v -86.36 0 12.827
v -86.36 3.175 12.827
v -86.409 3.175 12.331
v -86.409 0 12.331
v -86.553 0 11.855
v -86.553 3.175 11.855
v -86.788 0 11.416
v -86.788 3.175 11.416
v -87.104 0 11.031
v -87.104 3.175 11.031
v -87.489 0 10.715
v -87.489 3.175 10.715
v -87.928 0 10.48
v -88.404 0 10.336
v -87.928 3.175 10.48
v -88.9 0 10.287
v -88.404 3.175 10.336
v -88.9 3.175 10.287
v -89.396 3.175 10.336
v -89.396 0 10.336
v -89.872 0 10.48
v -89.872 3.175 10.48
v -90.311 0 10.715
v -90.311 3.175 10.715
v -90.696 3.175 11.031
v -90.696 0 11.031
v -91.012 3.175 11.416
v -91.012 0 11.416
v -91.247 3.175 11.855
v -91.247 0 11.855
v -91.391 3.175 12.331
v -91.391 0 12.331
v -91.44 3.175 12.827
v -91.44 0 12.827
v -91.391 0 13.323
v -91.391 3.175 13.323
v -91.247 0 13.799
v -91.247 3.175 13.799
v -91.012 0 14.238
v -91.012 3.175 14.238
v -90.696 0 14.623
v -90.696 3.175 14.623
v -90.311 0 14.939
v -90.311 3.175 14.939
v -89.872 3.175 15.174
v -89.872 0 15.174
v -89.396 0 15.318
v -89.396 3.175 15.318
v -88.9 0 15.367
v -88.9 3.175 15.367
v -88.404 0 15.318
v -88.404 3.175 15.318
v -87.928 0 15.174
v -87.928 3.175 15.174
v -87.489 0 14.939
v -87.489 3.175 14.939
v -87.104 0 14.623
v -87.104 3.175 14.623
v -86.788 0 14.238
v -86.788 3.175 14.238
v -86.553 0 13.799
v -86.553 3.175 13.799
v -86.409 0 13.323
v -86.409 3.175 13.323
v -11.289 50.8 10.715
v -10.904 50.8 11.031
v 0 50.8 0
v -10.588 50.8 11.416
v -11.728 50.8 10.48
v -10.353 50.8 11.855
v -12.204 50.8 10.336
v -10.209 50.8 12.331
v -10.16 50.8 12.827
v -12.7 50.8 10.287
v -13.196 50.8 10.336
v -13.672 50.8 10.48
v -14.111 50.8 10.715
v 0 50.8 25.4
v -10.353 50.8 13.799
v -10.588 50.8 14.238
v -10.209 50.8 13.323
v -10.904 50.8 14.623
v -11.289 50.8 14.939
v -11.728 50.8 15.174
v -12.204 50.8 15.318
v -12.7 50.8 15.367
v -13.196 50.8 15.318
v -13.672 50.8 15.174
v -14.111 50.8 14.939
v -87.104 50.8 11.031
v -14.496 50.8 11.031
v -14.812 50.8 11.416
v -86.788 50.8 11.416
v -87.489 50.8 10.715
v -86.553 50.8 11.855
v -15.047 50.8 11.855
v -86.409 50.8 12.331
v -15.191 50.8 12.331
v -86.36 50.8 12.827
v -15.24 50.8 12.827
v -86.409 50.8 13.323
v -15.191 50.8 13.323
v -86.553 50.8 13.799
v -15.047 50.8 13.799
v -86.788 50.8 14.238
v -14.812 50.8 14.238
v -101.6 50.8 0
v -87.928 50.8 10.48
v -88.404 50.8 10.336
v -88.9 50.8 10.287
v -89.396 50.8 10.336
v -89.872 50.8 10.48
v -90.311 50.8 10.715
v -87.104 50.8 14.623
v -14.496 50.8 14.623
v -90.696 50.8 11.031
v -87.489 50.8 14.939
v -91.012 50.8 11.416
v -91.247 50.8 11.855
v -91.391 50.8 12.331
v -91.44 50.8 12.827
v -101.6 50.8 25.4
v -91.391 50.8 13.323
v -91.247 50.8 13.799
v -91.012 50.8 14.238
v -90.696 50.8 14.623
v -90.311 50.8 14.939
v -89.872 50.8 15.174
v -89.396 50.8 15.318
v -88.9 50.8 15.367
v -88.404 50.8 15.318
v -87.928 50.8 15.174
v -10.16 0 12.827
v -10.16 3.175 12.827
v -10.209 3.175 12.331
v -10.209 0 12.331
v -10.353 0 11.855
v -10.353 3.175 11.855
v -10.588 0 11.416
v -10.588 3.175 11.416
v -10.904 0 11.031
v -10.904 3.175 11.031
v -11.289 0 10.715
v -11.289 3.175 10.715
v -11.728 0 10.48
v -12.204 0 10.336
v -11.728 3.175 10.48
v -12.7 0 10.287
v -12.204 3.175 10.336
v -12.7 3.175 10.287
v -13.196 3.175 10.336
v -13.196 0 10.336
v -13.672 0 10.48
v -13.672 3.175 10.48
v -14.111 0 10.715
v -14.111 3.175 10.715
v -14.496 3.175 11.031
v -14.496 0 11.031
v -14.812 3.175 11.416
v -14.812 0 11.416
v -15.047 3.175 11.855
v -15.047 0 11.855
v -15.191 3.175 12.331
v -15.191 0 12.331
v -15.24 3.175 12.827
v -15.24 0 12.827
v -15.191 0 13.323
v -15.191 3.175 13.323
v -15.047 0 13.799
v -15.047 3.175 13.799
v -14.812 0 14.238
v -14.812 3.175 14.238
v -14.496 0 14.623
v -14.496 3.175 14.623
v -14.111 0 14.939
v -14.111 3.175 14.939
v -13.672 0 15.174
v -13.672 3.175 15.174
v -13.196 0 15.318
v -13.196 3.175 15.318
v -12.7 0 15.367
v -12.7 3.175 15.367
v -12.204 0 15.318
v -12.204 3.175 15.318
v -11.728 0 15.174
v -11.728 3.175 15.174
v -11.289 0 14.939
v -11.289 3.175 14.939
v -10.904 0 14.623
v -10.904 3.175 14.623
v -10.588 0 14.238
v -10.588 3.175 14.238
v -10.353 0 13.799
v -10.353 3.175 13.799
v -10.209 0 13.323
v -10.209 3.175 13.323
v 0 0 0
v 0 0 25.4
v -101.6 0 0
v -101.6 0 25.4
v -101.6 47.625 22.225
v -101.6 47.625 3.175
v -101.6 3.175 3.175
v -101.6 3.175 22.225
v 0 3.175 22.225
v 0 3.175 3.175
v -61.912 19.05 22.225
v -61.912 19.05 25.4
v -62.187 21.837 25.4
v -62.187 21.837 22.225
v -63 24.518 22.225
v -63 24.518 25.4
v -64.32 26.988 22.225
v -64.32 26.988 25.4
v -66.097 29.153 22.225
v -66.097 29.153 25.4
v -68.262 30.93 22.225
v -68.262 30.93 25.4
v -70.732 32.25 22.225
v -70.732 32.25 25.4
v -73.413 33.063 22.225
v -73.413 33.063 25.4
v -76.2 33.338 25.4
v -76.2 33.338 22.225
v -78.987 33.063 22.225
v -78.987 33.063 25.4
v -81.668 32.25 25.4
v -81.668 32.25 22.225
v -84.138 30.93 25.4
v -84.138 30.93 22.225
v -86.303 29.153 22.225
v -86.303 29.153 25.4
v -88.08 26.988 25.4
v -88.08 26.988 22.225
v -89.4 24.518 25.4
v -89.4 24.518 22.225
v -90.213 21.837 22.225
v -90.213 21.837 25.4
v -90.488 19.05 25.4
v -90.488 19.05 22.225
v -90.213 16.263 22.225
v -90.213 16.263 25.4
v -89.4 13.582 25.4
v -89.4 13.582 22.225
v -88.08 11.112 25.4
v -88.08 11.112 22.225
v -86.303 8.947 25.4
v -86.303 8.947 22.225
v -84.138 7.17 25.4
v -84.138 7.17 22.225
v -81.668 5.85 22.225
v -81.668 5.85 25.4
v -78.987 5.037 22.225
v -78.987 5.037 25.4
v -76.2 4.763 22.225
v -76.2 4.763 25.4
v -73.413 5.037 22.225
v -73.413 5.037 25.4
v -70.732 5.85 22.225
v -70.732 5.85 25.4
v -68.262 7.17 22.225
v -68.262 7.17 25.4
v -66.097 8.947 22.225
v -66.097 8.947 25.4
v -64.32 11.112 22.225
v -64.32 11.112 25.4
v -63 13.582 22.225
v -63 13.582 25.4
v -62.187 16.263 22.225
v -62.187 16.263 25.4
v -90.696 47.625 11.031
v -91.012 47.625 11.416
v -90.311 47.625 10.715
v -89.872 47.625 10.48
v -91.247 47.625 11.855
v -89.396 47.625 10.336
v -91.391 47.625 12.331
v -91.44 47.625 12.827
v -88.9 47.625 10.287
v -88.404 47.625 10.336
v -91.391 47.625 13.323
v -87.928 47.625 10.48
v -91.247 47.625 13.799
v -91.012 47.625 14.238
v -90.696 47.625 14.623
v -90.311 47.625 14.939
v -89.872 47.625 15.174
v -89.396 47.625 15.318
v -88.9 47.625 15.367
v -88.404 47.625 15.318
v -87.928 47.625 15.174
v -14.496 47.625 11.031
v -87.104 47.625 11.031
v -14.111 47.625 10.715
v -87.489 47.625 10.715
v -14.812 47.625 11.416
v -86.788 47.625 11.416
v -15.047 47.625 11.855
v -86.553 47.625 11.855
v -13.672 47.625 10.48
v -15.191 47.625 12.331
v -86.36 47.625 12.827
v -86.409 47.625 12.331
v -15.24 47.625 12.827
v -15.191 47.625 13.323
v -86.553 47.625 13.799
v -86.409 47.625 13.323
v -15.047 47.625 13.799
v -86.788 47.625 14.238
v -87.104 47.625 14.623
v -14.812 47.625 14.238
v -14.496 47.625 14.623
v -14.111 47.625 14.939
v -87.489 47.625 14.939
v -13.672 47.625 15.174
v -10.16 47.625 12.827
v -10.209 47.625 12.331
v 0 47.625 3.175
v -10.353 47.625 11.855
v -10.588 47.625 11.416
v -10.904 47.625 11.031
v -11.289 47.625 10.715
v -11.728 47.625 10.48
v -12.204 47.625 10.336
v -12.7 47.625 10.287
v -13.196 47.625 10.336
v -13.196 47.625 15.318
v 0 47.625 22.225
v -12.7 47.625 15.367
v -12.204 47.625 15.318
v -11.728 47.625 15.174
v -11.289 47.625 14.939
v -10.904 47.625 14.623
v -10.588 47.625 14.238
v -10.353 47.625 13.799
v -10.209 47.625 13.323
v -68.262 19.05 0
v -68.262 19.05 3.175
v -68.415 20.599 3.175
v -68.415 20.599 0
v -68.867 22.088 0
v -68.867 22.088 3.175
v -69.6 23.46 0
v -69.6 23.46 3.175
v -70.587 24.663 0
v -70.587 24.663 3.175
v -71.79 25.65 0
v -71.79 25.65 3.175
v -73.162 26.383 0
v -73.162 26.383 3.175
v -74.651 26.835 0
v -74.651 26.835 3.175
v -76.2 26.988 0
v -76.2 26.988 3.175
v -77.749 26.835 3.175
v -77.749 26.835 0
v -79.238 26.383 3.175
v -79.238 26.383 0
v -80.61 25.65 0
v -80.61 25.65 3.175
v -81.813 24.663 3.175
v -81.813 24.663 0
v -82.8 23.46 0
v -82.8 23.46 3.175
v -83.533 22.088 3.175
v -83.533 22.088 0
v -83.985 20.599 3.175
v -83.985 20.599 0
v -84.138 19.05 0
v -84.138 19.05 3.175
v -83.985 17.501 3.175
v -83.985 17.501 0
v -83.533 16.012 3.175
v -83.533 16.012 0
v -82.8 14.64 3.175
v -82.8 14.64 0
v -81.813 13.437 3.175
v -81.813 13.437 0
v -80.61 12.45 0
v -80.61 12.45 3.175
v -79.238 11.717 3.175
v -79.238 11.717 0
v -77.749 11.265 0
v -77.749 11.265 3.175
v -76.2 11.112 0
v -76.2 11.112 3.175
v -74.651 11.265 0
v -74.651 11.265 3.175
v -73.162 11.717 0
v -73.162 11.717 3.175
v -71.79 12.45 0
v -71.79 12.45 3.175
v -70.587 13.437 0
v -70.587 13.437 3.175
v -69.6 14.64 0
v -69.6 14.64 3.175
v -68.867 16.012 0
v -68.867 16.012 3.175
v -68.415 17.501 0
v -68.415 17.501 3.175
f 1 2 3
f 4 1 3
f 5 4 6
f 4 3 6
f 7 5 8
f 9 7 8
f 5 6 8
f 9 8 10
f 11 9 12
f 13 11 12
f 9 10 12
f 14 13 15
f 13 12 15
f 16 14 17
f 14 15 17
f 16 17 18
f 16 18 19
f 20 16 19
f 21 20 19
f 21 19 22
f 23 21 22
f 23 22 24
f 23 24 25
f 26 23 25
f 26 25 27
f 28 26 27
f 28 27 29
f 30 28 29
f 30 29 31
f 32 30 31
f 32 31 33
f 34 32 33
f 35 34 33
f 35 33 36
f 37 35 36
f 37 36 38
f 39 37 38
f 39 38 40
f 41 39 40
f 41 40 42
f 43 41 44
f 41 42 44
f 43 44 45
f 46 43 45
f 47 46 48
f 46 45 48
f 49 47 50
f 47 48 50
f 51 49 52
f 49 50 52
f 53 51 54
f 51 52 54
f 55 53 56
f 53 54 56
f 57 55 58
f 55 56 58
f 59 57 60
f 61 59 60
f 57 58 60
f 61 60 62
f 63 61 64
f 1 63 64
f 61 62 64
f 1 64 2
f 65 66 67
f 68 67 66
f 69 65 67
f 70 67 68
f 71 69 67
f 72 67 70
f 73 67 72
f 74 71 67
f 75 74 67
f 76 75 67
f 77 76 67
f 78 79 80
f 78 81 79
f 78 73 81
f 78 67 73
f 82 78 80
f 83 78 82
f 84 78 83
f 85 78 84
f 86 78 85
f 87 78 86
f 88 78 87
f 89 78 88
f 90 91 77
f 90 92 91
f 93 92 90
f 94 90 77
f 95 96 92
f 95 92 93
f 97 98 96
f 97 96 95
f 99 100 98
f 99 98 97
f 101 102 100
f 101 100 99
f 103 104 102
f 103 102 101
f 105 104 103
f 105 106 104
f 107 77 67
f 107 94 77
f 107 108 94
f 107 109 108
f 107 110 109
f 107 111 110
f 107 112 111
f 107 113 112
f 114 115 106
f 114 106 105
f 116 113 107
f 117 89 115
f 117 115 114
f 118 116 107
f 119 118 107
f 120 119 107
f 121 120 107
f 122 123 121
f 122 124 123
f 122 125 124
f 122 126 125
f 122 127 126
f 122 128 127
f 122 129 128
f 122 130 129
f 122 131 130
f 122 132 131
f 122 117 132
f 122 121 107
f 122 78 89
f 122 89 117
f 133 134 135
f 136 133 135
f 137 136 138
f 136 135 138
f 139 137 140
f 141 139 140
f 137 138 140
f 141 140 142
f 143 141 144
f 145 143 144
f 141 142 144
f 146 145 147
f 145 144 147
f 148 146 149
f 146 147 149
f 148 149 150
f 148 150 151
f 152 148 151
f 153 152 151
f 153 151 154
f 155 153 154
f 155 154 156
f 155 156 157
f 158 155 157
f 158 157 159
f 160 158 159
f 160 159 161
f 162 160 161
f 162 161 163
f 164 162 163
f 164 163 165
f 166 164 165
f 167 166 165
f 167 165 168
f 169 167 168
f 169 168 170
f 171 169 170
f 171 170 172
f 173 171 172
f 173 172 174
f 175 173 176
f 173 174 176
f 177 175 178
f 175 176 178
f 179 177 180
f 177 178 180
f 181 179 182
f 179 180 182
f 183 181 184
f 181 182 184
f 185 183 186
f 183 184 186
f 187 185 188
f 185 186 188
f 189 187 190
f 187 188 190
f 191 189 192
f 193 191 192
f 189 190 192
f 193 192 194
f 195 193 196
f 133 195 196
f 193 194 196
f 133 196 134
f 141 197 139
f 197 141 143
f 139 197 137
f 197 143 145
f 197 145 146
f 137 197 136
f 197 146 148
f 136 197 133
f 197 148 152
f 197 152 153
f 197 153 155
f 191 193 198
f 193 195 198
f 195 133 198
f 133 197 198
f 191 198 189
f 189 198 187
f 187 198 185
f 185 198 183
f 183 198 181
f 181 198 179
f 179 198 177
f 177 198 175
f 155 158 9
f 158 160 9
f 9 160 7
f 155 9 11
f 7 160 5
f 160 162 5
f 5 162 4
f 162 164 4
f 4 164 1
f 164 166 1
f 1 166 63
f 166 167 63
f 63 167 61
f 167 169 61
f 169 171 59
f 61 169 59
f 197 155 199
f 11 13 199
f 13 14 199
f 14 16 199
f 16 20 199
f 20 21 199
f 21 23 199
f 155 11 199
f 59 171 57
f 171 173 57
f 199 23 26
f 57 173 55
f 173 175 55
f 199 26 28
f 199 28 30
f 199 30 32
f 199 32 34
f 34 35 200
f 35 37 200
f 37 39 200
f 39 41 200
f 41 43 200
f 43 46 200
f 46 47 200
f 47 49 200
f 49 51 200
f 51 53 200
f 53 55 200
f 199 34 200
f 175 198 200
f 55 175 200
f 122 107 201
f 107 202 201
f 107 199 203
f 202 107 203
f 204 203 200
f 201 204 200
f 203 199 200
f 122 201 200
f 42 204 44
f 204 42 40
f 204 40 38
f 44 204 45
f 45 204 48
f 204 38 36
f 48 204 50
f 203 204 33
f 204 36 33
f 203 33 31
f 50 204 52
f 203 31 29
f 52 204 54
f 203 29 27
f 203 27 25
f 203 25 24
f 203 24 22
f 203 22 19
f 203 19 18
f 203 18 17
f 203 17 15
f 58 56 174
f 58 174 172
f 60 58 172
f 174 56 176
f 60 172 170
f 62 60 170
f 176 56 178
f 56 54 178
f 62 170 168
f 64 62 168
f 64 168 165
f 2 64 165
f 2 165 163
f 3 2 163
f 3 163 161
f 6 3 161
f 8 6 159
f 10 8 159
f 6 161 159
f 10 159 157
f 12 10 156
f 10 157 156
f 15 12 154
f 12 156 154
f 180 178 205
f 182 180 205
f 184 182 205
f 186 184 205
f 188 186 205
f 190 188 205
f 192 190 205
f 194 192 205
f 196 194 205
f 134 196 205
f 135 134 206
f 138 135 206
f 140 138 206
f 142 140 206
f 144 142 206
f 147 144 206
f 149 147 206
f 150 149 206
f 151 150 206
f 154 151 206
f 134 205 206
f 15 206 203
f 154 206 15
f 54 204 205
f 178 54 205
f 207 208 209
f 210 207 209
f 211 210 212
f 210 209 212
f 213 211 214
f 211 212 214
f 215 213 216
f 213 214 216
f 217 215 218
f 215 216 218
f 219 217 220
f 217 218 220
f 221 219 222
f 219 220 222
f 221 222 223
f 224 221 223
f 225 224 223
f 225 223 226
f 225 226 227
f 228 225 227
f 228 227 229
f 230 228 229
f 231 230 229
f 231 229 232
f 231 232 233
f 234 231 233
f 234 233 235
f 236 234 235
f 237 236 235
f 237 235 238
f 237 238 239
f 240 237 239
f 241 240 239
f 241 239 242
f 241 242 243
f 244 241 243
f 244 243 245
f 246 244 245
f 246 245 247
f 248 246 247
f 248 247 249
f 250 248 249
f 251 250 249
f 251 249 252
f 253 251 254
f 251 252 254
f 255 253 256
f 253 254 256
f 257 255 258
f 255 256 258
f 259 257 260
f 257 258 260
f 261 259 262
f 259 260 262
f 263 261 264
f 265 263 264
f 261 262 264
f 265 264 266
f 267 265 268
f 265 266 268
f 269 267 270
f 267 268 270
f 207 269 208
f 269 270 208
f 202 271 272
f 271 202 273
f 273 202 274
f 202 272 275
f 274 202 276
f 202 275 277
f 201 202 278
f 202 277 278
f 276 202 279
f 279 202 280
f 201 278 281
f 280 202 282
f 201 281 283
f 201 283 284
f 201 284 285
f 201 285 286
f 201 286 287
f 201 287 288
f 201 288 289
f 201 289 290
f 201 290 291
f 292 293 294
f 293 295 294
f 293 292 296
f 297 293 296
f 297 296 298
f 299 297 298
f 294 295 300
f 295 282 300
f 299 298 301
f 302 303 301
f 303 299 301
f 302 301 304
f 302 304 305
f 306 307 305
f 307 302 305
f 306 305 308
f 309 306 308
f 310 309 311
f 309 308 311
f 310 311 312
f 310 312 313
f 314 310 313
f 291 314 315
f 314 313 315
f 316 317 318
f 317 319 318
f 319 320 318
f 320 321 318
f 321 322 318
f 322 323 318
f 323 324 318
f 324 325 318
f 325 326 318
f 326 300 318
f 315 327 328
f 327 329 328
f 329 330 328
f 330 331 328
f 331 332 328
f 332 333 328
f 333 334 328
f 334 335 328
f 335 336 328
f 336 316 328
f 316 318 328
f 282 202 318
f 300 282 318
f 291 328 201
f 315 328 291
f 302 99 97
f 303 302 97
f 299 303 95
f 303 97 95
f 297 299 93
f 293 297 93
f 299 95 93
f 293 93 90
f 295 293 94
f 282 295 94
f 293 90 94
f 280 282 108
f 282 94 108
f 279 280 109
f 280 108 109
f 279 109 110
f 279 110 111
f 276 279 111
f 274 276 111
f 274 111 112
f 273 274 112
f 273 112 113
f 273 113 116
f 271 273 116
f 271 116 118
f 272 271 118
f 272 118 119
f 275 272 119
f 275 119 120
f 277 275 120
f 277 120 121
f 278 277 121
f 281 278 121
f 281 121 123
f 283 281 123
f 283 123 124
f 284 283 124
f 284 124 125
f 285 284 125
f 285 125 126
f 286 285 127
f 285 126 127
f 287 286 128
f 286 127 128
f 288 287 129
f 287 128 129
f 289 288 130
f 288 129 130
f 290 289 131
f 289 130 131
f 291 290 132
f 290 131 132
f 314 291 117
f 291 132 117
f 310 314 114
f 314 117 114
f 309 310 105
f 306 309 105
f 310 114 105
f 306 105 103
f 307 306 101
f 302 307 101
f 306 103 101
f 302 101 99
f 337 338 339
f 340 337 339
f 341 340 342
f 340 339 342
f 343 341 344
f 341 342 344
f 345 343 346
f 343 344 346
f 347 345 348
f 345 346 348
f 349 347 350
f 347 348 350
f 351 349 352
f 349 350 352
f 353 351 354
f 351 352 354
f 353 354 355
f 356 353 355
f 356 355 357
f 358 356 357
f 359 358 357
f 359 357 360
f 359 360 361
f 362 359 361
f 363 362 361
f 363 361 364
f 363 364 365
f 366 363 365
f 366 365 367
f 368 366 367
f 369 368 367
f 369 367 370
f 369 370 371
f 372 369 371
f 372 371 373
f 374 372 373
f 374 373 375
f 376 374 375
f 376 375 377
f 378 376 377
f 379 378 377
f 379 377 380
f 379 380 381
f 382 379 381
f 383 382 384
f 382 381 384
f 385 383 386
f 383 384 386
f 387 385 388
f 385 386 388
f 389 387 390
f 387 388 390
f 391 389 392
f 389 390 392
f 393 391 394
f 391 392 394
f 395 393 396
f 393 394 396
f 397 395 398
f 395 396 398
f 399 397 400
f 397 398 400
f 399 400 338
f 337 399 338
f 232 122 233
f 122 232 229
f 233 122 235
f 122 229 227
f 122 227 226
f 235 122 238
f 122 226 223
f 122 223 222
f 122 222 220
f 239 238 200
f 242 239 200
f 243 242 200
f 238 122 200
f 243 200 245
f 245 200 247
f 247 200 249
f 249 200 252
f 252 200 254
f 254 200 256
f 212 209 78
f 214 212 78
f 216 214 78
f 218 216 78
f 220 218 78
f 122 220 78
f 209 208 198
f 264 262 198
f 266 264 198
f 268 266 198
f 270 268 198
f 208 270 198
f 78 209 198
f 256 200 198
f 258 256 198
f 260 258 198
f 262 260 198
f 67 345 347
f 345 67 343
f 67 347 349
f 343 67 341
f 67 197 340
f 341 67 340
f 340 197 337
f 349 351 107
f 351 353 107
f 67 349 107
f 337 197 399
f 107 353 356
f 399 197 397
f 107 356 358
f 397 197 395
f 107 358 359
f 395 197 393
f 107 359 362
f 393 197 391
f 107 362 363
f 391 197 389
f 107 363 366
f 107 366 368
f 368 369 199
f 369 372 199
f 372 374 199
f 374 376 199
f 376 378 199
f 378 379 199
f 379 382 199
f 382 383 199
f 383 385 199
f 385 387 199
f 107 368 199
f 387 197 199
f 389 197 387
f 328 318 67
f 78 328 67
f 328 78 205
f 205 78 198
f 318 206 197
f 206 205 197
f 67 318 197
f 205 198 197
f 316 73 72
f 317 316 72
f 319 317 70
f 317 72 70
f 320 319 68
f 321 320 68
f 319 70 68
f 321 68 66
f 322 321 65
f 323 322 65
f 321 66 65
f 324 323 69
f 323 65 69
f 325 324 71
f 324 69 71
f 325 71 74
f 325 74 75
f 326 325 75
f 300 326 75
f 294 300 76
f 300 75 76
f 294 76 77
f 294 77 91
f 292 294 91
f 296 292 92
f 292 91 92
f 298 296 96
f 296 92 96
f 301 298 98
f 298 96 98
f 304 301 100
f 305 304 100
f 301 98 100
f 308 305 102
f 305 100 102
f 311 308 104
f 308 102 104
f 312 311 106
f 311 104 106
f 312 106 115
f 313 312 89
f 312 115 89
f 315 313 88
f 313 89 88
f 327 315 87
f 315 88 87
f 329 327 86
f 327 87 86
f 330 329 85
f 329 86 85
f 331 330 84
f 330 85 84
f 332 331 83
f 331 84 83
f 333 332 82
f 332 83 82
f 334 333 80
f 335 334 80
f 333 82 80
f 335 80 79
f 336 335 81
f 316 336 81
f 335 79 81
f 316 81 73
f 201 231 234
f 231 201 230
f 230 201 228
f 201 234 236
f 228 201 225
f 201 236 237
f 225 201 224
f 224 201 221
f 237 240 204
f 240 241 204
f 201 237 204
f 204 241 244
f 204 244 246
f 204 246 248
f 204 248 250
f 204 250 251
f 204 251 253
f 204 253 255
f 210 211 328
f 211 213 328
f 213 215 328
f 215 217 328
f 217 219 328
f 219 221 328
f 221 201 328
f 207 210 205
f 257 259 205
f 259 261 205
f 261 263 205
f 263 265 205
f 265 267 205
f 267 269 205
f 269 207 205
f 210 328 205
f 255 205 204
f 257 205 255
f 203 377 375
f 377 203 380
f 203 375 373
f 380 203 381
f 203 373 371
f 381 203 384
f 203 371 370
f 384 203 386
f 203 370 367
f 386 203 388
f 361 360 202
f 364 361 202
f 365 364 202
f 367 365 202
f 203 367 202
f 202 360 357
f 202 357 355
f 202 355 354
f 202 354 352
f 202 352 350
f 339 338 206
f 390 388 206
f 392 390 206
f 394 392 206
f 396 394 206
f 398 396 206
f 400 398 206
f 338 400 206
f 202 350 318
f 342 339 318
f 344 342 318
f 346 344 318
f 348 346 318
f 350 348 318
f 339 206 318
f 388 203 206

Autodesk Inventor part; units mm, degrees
ref_plane "YZ Plane" through (0, 0, 0) normal (1, 0, 0) x (0, 1, 0)
ref_plane "XZ Plane" through (0, 0, 0) normal (0, 1, 0) x (-1, 0, 0)
ref_plane "XY Plane" through (0, 0, 0) normal (0, 0, 1) x (1, 0, 0)
sketch "Sketch1" plane through (0, 0, 0) normal (0, 1, 0) x (-1, 0, 0)
  line L0 (0, 0) -> (101.6, 0)
  line L1 (101.6, 0) -> (101.6, 25.4)
  line L2 (101.6, 25.4) -> (0, 25.4)
  line L3 (0, 25.4) -> (0, 0)
  dimension "d0" = 101.6
  dimension "d1" = 25.4
extrude "Extrusion1" add sketch "Sketch1" along normal blind 50.8
sketch "Sketch2" plane through (-101.6, 0, 25.4) normal (0, 0, 1) x (1, 0, 0)
  circle A0 centre (25.4, 19.05) radius 7.9375
  line L0 (101.6, 50.8) -> (0, 50.8) projected
  line L1 (101.6, 0) -> (101.6, 50.8) projected
  dimension "d4" = 15.875
  dimension "d5" = 31.75
  dimension "d6" = 76.2
extrude "Extrusion2" cut sketch "Sketch2" against normal blind 111.125
sketch "Sketch3" plane through (0, 0, 25.4) normal (1, 0, 0) x (0, 0, -1)
  line L0 (3.175, 3.175) -> (22.225, 3.175)
  line L1 (22.225, 3.175) -> (22.225, 47.625)
  line L2 (22.225, 47.625) -> (3.175, 47.625)
  line L3 (3.175, 47.625) -> (3.175, 3.175)
  line L4 (0, 0) -> (0, 50.8) projected
  line L5 (0, 0) -> (25.4, 0) projected
  line L6 (25.4, 0) -> (25.4, 50.8) projected
  line L7 (25.4, 50.8) -> (0, 50.8) projected
  dimension "d9" = 3.175
  dimension "d10" = 3.175
  dimension "d11" = 3.175
  dimension "d12" = 3.175
extrude "Extrusion3" cut sketch "Sketch3" against normal blind 111.125 contours L3 L2 L1 L0
sketch "Sketch4" plane through (0, 50.8, 0) normal (0, 1, 0) x (1, 0, 0)
  circle A0 centre (-12.7, -12.827) radius 2.54
  circle A1 centre (-88.9, -12.827) radius 2.54
  line L0 (0, 0) -> (-101.6, 0) projected
  line L1 (-101.6, 0) -> (-101.6, -25.4) projected
  line L2 (0, -25.4) -> (0, 0) projected
  dimension "d15" = 5.08
  dimension "d16" = 12.827
  dimension "d17" = 12.7
  dimension "d18" = 5.08
  dimension "d19" = 12.827
  dimension "d20" = 12.7
  dimension "d21" = 76.2
extrude "Extrusion4" cut sketch "Sketch4" against normal blind 111.125
sketch "Sketch5" plane through (-101.6, 0, 25.4) normal (0, 0, 1) x (1, 0, 0)
  circle A0 centre (25.4, 19.05) radius 7.9375 projected
  circle A1 centre (25.4, 19.05) radius 14.2875
  point P0 (101.6, 0)
  dimension "d24" = 28.575
extrude "Extrusion5" cut sketch "Sketch5" against normal blind 5.08
properties part number "15102898-16-P-0306" material "Aluminum 6061"
